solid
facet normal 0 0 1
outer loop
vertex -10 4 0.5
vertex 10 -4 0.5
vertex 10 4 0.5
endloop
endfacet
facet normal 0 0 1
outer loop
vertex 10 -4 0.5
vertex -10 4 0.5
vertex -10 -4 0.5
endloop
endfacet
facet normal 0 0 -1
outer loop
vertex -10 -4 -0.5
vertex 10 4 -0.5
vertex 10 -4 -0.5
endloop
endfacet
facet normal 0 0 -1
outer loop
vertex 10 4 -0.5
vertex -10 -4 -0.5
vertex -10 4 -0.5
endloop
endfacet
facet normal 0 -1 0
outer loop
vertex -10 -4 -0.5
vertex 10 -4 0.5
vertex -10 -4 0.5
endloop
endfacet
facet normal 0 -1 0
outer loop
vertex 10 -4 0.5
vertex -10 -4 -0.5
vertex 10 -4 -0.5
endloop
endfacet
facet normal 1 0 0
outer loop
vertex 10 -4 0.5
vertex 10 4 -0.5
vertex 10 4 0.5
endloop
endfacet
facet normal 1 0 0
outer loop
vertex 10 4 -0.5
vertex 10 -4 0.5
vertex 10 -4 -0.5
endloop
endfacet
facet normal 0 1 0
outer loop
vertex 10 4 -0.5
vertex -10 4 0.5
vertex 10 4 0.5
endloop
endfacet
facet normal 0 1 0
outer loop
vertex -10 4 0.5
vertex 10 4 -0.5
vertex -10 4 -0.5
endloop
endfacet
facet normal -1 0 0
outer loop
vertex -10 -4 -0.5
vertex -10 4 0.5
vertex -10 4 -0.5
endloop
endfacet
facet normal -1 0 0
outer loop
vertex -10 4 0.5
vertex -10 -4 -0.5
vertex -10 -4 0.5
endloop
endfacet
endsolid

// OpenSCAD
//:Model "Tag" [0.9,0.9,0.9]
module tag()
{
    color([0.9,0.9,0.9]) {
       cube([20,8,1], center=true);
    }
}

tag();
